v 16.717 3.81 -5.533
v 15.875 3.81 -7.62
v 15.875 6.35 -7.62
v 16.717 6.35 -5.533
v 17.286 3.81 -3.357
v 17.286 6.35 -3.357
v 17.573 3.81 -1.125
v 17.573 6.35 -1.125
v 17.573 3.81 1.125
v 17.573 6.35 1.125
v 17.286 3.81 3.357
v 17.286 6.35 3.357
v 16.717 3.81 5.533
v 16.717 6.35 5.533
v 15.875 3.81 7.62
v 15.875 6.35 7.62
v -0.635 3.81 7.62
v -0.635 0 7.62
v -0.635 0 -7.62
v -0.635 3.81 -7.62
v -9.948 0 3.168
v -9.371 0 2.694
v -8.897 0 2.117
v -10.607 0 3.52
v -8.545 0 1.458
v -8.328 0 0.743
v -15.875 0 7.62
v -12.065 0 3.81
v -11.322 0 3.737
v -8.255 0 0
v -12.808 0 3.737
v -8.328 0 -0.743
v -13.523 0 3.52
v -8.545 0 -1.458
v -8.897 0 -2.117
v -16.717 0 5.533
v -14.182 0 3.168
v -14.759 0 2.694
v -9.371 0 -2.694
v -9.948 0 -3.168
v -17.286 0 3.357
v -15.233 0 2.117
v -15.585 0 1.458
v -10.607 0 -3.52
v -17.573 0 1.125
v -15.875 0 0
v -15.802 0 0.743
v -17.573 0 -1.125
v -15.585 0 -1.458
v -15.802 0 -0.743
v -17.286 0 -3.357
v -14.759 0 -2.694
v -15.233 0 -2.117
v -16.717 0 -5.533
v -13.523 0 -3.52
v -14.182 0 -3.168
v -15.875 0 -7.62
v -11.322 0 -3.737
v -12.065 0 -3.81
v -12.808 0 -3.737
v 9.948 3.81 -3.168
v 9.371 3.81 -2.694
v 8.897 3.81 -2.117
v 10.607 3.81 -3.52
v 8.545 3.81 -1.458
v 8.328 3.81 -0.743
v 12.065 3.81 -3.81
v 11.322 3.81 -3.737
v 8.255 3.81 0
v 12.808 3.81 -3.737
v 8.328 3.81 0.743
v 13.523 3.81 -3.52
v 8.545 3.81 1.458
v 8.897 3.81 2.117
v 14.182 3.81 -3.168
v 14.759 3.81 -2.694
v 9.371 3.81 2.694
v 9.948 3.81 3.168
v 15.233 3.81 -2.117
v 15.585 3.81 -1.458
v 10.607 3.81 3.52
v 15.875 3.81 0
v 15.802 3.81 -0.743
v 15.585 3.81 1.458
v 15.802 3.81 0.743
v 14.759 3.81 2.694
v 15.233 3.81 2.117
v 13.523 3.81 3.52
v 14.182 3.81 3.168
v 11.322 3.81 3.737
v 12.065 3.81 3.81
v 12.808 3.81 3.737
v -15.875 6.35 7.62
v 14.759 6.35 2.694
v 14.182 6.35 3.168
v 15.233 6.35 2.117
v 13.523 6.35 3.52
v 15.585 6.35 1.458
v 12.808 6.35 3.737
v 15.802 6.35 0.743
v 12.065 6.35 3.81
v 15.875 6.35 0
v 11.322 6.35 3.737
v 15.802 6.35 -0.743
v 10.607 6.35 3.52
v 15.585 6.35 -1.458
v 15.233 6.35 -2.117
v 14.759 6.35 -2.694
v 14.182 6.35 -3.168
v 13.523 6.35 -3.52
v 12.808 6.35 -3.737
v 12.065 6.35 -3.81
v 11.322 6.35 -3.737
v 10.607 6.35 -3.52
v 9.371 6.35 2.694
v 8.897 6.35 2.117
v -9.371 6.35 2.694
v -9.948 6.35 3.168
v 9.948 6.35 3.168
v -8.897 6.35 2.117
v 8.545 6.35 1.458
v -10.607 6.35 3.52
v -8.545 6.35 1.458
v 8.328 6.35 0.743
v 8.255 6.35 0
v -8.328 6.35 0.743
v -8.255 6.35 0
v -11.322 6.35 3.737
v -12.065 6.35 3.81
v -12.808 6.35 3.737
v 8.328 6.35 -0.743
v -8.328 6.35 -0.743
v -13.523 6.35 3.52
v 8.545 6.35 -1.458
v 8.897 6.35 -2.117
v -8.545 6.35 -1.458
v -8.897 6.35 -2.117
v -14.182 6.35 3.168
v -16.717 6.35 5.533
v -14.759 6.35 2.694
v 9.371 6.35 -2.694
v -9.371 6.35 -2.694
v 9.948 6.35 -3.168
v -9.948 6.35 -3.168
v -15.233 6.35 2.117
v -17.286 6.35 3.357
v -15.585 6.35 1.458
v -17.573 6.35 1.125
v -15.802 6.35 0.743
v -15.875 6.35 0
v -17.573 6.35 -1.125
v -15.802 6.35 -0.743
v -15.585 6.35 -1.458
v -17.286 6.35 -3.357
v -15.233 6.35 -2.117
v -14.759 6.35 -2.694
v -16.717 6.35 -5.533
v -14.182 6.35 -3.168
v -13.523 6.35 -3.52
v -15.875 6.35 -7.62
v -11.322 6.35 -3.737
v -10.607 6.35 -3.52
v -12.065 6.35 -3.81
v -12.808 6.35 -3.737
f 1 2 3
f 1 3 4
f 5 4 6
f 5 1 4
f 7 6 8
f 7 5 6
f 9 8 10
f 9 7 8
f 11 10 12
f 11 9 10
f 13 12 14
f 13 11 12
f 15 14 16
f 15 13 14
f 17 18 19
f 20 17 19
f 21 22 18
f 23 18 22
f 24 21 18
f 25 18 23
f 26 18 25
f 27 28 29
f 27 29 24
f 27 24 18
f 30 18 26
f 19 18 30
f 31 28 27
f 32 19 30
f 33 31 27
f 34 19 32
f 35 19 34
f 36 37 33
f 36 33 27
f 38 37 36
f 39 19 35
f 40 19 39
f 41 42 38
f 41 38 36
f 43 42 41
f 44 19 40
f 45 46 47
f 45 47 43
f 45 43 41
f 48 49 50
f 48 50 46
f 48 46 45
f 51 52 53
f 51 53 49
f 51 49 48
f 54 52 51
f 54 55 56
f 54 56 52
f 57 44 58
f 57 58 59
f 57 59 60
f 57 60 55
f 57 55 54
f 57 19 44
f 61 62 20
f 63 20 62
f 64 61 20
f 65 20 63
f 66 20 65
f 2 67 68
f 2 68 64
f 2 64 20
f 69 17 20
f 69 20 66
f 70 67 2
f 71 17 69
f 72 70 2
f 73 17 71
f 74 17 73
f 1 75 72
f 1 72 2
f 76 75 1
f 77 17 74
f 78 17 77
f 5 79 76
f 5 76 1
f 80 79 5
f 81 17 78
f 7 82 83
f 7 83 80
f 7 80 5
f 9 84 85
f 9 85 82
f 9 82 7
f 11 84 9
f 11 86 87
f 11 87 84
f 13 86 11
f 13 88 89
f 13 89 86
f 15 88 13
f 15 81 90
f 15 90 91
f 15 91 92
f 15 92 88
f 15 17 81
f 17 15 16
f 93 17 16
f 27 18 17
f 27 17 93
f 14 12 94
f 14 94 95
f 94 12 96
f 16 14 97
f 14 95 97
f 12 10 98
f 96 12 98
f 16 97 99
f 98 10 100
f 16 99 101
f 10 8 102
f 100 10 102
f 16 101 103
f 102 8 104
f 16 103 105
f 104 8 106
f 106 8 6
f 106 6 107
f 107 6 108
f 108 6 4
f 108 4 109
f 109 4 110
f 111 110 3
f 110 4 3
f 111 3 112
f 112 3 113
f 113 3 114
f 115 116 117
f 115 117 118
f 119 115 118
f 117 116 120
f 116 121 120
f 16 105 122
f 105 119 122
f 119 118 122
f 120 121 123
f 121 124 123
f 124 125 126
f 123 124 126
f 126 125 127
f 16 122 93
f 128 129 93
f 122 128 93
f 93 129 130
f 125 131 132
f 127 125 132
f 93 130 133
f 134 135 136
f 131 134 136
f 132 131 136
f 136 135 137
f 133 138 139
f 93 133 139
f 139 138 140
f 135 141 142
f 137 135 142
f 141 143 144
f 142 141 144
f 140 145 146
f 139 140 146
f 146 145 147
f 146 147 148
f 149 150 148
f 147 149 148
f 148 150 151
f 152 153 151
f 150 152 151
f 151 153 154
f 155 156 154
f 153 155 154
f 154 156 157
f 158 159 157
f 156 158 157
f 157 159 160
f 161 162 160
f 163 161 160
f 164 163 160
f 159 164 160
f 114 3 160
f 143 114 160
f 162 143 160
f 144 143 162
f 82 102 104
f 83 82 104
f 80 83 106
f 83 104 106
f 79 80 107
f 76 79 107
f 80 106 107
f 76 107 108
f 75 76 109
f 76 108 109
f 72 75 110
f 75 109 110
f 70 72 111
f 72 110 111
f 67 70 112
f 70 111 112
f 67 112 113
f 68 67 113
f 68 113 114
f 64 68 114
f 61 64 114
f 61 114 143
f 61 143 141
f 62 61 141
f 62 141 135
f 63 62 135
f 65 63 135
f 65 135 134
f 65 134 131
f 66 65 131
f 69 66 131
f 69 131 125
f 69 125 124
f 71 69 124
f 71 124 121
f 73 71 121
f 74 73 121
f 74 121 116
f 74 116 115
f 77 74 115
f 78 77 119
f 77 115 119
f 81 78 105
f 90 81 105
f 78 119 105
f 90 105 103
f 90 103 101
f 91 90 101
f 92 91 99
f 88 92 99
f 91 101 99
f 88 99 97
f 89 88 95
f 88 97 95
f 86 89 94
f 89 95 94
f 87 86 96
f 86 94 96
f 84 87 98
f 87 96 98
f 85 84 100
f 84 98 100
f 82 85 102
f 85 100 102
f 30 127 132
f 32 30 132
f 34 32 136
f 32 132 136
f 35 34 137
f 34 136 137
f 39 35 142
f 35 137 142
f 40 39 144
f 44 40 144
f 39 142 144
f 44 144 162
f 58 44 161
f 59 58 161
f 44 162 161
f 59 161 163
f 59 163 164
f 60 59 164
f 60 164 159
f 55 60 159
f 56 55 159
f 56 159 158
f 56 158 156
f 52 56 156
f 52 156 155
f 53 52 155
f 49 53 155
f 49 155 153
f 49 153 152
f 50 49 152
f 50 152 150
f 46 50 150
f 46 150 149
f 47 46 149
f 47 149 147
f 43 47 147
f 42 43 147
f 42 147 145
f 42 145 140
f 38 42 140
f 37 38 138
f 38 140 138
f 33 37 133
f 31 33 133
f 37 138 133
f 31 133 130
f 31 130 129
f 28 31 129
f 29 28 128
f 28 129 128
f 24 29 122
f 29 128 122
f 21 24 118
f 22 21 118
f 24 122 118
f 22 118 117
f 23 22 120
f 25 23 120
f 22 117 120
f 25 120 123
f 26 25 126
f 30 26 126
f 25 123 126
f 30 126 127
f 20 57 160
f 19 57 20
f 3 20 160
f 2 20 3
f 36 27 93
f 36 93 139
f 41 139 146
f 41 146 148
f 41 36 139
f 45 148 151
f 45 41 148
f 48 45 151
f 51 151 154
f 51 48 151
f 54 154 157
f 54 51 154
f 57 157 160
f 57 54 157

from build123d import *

# Parameters (mm, degrees)
BOSS_EXTRUDE2_DEPTH = 6.35
SKETCH4_R           = 3.81
CUT_EXTRUDE1_DEPTH  = 12.7
CUT_EXTRUDE2_DEPTH  = 3.81


with BuildPart() as part:
    # Sketch3 → Boss-Extrude2 (new body)
    with BuildSketch(Plane(origin=(0, 0, 0), x_dir=(1, 0, 0), z_dir=(0, 1, 0))):
        with BuildLine():
            Line((-15.875, 7.62), (15.875, 7.62))
            ThreePointArc((15.875, 7.62), (17.609089272, 0), (15.875, -7.62))
            Line((15.875, -7.62), (-15.875, -7.62))
            ThreePointArc((-15.875, -7.62), (-17.609089272, 0), (-15.875, 7.62))
        make_face()
    extrude(amount=BOSS_EXTRUDE2_DEPTH)

    # Sketch4 → Cut-Extrude1 (cut)
    with BuildSketch(Plane(origin=(0, 6.35, 0), x_dir=(1, 0, 0), z_dir=(0, 1, 0))):
        with Locations((12.065, 0)):
            Circle(SKETCH4_R)
        with Locations((-12.065, 0)):
            Circle(SKETCH4_R)
    extrude(amount=-CUT_EXTRUDE1_DEPTH, mode=Mode.SUBTRACT)

    # Sketch5 → Cut-Extrude2 (cut)
    with BuildSketch(Plane.XZ):
        with BuildLine():
            Line((15.875, 7.62), (-0.635, 7.62))
            Line((-0.635, 7.62), (-0.635, -7.62))
            Line((-0.635, -7.62), (15.875, -7.62))
            ThreePointArc((15.875, -7.62), (17.609089272, 0), (15.875, 7.62))
        make_face()
    extrude(amount=-CUT_EXTRUDE2_DEPTH, mode=Mode.SUBTRACT)


solid = part.part
